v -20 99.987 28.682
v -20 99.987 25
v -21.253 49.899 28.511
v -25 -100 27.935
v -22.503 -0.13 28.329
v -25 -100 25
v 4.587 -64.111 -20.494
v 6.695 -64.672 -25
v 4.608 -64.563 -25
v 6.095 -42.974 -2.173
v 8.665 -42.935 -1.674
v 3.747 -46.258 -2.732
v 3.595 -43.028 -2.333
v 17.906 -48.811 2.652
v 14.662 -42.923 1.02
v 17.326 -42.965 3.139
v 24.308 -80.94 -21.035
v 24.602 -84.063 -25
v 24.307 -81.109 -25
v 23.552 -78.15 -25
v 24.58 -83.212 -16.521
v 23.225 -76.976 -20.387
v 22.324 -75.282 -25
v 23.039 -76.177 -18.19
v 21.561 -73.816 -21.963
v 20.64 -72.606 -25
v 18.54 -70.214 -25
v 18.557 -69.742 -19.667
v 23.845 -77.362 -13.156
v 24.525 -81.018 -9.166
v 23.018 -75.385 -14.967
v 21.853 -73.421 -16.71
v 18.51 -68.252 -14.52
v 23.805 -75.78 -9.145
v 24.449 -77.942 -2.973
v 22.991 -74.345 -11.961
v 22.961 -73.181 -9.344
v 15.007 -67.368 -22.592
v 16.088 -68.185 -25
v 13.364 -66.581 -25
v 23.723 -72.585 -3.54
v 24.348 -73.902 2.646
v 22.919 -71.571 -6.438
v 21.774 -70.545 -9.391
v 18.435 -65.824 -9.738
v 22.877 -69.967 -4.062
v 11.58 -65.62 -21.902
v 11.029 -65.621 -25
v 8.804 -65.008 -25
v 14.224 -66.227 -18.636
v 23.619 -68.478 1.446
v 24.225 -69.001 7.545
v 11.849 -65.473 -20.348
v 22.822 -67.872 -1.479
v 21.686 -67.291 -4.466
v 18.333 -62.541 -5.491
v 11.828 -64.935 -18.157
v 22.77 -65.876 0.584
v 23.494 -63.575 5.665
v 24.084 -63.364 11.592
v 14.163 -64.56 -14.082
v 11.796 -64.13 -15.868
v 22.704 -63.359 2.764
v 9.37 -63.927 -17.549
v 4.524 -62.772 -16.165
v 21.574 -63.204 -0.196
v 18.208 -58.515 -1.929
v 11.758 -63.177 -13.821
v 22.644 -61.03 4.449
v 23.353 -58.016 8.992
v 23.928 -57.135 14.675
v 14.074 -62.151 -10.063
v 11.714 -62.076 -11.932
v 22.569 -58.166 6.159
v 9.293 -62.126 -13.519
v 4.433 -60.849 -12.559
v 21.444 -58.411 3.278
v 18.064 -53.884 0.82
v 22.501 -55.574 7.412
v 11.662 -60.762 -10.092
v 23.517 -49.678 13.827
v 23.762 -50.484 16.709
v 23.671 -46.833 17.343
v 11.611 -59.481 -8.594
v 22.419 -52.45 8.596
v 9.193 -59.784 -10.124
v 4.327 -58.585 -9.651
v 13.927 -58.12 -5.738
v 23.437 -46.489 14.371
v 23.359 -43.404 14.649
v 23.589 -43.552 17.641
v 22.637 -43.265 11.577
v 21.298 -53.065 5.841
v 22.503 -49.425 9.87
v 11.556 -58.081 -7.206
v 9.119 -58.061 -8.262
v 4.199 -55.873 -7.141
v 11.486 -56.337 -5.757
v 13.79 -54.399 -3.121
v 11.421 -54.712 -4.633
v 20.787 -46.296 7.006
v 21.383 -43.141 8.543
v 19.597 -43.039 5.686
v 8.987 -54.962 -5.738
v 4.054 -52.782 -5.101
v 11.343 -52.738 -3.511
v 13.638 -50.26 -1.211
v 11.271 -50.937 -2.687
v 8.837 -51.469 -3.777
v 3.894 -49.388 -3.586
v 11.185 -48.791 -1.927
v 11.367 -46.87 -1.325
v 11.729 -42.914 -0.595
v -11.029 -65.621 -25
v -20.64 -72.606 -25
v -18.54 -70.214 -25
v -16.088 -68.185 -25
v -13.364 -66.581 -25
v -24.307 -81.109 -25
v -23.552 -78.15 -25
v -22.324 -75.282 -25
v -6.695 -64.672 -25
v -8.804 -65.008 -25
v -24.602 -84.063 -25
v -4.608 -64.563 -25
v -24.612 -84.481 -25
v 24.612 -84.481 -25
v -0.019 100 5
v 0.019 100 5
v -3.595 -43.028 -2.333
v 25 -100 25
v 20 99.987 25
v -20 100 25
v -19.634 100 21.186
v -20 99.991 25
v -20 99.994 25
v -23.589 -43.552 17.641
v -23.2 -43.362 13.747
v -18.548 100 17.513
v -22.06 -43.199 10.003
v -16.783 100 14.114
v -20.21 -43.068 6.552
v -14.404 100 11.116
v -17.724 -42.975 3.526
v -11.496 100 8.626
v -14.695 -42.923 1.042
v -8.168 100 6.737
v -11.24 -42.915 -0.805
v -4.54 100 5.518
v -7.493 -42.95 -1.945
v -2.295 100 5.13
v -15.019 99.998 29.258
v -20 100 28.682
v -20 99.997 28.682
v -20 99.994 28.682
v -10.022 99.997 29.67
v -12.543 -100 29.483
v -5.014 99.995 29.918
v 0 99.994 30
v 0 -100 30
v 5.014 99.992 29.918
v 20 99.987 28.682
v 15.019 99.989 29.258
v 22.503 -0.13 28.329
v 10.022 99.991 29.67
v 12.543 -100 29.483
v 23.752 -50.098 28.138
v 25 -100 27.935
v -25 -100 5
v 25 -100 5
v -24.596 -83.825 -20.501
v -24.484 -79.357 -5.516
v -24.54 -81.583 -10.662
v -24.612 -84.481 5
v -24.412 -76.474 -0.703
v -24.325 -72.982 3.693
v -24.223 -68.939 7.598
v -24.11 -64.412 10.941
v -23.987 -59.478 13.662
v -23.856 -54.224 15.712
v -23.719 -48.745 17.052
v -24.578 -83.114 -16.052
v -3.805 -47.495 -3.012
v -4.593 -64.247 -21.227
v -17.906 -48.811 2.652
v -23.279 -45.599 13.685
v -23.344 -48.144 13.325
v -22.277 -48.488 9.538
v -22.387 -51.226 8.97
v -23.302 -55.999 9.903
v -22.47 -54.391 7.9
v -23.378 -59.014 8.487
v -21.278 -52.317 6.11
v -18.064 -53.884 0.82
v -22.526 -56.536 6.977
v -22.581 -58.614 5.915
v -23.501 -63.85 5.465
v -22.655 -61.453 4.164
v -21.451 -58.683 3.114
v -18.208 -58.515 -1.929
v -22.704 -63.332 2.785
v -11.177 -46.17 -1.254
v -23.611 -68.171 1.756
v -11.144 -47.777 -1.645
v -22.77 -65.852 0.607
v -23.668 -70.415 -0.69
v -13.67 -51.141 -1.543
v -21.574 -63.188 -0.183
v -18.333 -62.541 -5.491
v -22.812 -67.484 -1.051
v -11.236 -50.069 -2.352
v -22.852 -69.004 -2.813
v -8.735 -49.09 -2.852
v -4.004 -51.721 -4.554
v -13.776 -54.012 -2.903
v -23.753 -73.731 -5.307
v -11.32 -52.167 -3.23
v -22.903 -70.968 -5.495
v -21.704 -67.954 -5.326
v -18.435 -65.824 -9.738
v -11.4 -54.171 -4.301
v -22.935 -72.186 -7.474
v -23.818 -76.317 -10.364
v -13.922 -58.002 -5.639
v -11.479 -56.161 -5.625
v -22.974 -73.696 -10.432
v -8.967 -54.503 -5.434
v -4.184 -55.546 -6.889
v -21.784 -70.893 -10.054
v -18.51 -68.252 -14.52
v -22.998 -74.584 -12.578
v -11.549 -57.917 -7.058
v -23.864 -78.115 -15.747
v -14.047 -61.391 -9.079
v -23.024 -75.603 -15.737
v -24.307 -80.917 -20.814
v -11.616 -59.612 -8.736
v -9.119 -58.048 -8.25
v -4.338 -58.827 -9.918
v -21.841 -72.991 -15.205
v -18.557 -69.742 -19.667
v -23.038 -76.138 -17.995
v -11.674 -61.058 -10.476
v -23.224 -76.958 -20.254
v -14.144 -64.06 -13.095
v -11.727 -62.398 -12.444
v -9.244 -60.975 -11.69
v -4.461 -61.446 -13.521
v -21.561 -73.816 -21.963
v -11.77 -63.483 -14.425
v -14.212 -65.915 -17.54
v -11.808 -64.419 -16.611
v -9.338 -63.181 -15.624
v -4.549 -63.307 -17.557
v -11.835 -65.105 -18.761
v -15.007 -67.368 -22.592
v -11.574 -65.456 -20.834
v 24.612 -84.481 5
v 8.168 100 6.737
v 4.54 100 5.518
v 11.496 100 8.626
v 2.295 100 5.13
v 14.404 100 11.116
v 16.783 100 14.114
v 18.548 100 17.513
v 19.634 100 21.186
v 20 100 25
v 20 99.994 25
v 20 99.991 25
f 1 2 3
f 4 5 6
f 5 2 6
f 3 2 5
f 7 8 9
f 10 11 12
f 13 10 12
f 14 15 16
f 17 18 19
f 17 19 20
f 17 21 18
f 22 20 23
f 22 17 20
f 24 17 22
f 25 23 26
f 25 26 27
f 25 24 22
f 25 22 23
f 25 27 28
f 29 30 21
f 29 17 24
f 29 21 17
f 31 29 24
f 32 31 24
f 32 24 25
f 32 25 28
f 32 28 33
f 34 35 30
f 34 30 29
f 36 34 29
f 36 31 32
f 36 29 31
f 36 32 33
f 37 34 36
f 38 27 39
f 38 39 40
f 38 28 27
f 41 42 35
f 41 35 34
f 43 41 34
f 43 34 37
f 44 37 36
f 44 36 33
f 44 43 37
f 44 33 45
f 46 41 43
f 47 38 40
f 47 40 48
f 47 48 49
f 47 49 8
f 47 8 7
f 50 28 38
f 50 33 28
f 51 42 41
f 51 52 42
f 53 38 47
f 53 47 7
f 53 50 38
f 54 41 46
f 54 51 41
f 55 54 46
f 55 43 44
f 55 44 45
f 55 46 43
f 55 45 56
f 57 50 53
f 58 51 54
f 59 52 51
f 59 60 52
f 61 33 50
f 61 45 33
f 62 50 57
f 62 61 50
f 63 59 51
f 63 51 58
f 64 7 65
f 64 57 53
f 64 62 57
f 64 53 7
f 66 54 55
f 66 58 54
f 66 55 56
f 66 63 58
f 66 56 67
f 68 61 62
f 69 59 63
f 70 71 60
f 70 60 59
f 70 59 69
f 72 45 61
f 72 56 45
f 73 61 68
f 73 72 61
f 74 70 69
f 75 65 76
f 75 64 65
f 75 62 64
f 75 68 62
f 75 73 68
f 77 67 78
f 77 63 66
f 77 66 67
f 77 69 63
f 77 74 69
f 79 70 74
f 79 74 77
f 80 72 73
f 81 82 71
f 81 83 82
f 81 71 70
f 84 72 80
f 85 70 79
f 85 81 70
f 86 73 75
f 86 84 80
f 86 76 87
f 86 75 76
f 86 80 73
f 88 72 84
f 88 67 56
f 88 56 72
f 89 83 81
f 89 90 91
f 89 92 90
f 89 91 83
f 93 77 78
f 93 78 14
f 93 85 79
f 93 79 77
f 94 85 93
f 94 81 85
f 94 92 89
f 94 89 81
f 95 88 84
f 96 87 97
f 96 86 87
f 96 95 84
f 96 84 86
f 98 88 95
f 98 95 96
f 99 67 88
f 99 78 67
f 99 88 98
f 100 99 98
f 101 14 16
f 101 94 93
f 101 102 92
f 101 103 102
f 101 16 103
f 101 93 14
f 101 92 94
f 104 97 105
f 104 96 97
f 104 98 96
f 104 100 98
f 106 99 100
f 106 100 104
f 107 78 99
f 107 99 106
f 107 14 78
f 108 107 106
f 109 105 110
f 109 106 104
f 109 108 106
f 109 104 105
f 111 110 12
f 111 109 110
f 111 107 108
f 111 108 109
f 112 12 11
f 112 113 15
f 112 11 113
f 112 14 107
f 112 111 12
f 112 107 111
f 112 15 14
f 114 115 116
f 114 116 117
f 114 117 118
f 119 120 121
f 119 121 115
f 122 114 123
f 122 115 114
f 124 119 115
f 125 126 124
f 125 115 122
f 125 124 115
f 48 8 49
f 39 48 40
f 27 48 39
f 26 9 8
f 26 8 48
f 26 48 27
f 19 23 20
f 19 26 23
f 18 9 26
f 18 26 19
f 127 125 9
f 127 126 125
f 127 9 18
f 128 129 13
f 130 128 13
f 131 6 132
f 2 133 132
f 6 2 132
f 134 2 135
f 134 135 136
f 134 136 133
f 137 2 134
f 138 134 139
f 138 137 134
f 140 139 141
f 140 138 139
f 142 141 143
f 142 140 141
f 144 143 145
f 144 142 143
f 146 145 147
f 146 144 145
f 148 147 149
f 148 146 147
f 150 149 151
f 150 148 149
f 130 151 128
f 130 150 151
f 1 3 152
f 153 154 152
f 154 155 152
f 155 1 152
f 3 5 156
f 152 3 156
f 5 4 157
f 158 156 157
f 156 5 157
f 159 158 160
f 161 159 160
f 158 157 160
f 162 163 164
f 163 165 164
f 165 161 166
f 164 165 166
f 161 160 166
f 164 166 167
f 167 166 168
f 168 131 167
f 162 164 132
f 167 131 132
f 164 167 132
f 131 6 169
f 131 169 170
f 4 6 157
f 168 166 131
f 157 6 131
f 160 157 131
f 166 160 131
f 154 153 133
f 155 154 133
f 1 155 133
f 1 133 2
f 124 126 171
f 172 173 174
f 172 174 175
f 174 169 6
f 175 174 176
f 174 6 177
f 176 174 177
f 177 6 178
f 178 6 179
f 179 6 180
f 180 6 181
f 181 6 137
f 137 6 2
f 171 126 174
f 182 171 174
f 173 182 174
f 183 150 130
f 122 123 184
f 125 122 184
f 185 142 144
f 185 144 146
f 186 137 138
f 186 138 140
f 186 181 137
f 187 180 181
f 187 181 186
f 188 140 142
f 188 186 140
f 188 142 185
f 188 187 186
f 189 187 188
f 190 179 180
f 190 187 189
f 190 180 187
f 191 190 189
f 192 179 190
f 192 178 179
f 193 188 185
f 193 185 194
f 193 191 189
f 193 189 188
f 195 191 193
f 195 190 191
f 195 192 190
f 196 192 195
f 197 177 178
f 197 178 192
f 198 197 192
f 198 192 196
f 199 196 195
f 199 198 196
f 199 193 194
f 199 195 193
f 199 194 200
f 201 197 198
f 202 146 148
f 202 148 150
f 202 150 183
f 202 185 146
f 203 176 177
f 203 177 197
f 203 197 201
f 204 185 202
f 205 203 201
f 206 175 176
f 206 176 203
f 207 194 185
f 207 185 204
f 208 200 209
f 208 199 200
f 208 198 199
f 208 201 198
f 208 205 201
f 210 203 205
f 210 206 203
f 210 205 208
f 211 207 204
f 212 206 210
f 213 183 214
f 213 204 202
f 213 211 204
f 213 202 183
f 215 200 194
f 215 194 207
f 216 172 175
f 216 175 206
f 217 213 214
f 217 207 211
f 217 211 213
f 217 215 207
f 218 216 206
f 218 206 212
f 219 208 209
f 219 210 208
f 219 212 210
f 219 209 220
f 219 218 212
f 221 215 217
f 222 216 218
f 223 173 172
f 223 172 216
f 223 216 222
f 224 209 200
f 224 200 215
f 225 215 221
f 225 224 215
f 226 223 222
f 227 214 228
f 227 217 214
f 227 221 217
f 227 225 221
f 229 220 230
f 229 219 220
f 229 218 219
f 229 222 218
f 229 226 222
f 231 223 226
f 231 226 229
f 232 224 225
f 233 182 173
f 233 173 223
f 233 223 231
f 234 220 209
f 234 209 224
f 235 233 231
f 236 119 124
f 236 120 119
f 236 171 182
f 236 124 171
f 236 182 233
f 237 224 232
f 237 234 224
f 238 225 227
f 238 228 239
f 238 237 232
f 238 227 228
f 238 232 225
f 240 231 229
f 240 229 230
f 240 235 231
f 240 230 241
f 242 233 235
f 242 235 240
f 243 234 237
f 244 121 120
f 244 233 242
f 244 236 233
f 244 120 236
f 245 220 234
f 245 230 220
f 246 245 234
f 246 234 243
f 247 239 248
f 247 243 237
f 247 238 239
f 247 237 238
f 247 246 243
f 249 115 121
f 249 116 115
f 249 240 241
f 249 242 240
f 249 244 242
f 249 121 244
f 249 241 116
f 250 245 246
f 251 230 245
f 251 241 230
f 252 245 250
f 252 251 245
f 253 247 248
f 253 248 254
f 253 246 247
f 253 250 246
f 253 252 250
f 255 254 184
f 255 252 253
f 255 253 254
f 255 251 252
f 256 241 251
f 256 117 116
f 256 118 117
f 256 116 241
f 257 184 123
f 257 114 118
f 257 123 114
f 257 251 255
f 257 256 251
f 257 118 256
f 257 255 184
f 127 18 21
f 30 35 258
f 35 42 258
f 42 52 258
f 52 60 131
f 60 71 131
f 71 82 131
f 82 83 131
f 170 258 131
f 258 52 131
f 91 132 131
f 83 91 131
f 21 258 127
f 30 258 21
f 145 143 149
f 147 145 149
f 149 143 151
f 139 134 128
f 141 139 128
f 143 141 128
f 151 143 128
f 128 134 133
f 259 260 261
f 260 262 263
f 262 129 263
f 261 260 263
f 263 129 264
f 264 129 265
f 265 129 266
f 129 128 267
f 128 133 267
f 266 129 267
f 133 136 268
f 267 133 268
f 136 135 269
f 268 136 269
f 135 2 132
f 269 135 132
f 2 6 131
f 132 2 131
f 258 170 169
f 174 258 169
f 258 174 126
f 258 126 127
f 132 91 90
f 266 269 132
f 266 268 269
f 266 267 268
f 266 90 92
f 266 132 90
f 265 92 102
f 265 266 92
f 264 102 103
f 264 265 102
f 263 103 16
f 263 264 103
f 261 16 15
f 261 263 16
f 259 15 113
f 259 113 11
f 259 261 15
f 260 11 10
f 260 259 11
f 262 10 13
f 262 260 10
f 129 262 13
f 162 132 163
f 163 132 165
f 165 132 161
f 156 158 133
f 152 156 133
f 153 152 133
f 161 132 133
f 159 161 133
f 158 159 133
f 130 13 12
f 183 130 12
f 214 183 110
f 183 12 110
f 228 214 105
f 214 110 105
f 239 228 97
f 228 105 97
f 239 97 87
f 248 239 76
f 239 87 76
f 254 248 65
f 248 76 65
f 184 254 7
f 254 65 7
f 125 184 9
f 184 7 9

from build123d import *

# Parameters (mm, degrees)
F0_W      = 50
F0_H      = 50
F1_DEPTH  = 100
F3_DEPTH  = 50
F5_DEPTH  = 100
F6_R      = 20
F7_W      = 50
F7_H      = 30
F8_DEPTH  = 15.5194
F10_DEPTH = 5
F12_DEPTH = 247.65


with BuildPart() as f1:
    # F0 (on Front) → F1 (new body, symmetric)
    with BuildSketch(Plane.XZ):
        Rectangle(F0_W, F0_H)
    extrude(amount=F1_DEPTH, both=True)

    # F2 (on Right) → F3 (cut, symmetric)
    with BuildSketch(Plane.YZ):
        with BuildLine():
            Line((100, -25), (100, 5))
            Line((100, 5), (-43.0279051889, -2.3330381387))
            ThreePointArc((-43.0279051889, -2.3330381387), (-58.3205323775, -9.3672610402), (-64.5625040829, -25))
            Line((-64.5625040829, -25), (100, -25))
        make_face()
    extrude(amount=F3_DEPTH, both=True, mode=Mode.SUBTRACT)

    # F4 (on face) → F5 (cut)
    with BuildSketch(Plane.XY.offset(25)):
        Polygon((20, 100), (25, -100), (25, 100), align=None)
        Polygon((-25, 100), (-25, -100), (-20, 100), align=None)
    extrude(amount=-F5_DEPTH, mode=Mode.SUBTRACT)

    # F6
    f6_edges = [f1.edges().sort_by_distance(p)[0] for p in [
        (-23.957984, -58.319375, -9.366043),
        (-21.787849, 28.486047, 1.333481),
        (23.957984, -58.319375, -9.366043),
        (21.787849, 28.486047, 1.333481),
    ]]
    fillet(f6_edges, radius=F6_R)

    # F7 (on face) + F5_face (on face) → F8 (cut)
    with BuildSketch(Plane.XZ.offset(100)):
        Polygon((-25, 5), (-49.858982116, 5), (-49.858982116, -46.5103157897), (38.4103864431, -46.5103157897), (38.4103864431, 5), (25, 5), (25, -25), (-25, -25), align=None)
        with Locations((0, -10)):
            Rectangle(F7_W, F7_H)
    with BuildSketch(Plane(origin=(23.9793030666, -59.1721226651, 10.645525808), x_dir=(-0.0249921912, 0.9996876464, 0), z_dir=(0.9996876464, 0.0249921912, 0))):
        with BuildLine():
            Line((159.2093327542, 14.354474192), (-40.8406340537, 14.354474192))
            Line((-40.8406340537, 14.354474192), (-40.8406340537, -35.645525808))
            Line((-40.8406340537, -35.645525808), (-24.8983146726, -35.645525808))
            add(Edge.make_bspline(
                [(-24.8983146726, -35.645525808), (-24.8983146726, -28.5189194369), (-23.5596532338, -21.3920395037), (-20.8811621052, -14.5498230985), (-16.9361703967, -8.2751379661), (-11.8512306272, -2.8349400363), (-5.8484473226, 1.5446106479), (0.8535722788, 4.7053748996), (7.9583449614, 6.5081180205), (15.2033728728, 6.9693809999), (15.2436796153, 6.9723934073), (15.292966243, 6.9759620541), (15.3482692051, 6.9795006457), (15.4035800403, 6.982907422), (15.4588912365, 6.9862696529), (15.5142174043, 6.9893670157), (15.5695480956, 6.9923653034), (15.6248871844, 6.9952016513)],
                knots=[0, 0, 0, 0, 0, 0, 0, 0, 0, 0, 34.494586798, 34.494586798, 34.494586798, 34.494586798, 34.494586798, 34.494586798, 34.494586798, 34.494586798, 34.9932152432, 34.9932152432, 34.9932152432, 34.9932152432, 34.9932152432, 34.9932152432, 34.9932152432, 34.9932152432, 34.9932152432, 34.9932152432], degree=9))
            Line((15.6248871844, 6.9952016513), (159.2093327542, 14.354474192))
        make_face()
    extrude(amount=-F8_DEPTH, dir=(0, -1, 0), mode=Mode.SUBTRACT)


with BuildPart() as f10:
    # F9 (on face) → F10 (new body)
    with BuildSketch(Plane.XY.offset(25)):
        Polygon((-25, -100), (25, -100), (20.0003129879, 99.9874804822), (-20, 100), (-20.0003129879, 99.9874804822), align=None)
    extrude(amount=F10_DEPTH)

    # F11 (on face) → F12 (cut)
    with BuildSketch(Plane.XZ.offset(100)):
        with BuildLine():
            ThreePointArc((-36.7045857163, 25.5139391247), (-3.6151698091, 29.9571151842), (29.6477454186, 27.0883647365))
            Line((29.6477454186, 27.0883647365), (32.5201489031, 41.5777564049))
            Line((32.5201489031, 41.5777564049), (-40.051523596, 41.5777564049))
            Line((-40.051523596, 41.5777564049), (-36.7045857163, 25.5139391247))
        make_face()
    extrude(amount=-F12_DEPTH, mode=Mode.SUBTRACT)


solid = Compound([f1.part, f10.part])
